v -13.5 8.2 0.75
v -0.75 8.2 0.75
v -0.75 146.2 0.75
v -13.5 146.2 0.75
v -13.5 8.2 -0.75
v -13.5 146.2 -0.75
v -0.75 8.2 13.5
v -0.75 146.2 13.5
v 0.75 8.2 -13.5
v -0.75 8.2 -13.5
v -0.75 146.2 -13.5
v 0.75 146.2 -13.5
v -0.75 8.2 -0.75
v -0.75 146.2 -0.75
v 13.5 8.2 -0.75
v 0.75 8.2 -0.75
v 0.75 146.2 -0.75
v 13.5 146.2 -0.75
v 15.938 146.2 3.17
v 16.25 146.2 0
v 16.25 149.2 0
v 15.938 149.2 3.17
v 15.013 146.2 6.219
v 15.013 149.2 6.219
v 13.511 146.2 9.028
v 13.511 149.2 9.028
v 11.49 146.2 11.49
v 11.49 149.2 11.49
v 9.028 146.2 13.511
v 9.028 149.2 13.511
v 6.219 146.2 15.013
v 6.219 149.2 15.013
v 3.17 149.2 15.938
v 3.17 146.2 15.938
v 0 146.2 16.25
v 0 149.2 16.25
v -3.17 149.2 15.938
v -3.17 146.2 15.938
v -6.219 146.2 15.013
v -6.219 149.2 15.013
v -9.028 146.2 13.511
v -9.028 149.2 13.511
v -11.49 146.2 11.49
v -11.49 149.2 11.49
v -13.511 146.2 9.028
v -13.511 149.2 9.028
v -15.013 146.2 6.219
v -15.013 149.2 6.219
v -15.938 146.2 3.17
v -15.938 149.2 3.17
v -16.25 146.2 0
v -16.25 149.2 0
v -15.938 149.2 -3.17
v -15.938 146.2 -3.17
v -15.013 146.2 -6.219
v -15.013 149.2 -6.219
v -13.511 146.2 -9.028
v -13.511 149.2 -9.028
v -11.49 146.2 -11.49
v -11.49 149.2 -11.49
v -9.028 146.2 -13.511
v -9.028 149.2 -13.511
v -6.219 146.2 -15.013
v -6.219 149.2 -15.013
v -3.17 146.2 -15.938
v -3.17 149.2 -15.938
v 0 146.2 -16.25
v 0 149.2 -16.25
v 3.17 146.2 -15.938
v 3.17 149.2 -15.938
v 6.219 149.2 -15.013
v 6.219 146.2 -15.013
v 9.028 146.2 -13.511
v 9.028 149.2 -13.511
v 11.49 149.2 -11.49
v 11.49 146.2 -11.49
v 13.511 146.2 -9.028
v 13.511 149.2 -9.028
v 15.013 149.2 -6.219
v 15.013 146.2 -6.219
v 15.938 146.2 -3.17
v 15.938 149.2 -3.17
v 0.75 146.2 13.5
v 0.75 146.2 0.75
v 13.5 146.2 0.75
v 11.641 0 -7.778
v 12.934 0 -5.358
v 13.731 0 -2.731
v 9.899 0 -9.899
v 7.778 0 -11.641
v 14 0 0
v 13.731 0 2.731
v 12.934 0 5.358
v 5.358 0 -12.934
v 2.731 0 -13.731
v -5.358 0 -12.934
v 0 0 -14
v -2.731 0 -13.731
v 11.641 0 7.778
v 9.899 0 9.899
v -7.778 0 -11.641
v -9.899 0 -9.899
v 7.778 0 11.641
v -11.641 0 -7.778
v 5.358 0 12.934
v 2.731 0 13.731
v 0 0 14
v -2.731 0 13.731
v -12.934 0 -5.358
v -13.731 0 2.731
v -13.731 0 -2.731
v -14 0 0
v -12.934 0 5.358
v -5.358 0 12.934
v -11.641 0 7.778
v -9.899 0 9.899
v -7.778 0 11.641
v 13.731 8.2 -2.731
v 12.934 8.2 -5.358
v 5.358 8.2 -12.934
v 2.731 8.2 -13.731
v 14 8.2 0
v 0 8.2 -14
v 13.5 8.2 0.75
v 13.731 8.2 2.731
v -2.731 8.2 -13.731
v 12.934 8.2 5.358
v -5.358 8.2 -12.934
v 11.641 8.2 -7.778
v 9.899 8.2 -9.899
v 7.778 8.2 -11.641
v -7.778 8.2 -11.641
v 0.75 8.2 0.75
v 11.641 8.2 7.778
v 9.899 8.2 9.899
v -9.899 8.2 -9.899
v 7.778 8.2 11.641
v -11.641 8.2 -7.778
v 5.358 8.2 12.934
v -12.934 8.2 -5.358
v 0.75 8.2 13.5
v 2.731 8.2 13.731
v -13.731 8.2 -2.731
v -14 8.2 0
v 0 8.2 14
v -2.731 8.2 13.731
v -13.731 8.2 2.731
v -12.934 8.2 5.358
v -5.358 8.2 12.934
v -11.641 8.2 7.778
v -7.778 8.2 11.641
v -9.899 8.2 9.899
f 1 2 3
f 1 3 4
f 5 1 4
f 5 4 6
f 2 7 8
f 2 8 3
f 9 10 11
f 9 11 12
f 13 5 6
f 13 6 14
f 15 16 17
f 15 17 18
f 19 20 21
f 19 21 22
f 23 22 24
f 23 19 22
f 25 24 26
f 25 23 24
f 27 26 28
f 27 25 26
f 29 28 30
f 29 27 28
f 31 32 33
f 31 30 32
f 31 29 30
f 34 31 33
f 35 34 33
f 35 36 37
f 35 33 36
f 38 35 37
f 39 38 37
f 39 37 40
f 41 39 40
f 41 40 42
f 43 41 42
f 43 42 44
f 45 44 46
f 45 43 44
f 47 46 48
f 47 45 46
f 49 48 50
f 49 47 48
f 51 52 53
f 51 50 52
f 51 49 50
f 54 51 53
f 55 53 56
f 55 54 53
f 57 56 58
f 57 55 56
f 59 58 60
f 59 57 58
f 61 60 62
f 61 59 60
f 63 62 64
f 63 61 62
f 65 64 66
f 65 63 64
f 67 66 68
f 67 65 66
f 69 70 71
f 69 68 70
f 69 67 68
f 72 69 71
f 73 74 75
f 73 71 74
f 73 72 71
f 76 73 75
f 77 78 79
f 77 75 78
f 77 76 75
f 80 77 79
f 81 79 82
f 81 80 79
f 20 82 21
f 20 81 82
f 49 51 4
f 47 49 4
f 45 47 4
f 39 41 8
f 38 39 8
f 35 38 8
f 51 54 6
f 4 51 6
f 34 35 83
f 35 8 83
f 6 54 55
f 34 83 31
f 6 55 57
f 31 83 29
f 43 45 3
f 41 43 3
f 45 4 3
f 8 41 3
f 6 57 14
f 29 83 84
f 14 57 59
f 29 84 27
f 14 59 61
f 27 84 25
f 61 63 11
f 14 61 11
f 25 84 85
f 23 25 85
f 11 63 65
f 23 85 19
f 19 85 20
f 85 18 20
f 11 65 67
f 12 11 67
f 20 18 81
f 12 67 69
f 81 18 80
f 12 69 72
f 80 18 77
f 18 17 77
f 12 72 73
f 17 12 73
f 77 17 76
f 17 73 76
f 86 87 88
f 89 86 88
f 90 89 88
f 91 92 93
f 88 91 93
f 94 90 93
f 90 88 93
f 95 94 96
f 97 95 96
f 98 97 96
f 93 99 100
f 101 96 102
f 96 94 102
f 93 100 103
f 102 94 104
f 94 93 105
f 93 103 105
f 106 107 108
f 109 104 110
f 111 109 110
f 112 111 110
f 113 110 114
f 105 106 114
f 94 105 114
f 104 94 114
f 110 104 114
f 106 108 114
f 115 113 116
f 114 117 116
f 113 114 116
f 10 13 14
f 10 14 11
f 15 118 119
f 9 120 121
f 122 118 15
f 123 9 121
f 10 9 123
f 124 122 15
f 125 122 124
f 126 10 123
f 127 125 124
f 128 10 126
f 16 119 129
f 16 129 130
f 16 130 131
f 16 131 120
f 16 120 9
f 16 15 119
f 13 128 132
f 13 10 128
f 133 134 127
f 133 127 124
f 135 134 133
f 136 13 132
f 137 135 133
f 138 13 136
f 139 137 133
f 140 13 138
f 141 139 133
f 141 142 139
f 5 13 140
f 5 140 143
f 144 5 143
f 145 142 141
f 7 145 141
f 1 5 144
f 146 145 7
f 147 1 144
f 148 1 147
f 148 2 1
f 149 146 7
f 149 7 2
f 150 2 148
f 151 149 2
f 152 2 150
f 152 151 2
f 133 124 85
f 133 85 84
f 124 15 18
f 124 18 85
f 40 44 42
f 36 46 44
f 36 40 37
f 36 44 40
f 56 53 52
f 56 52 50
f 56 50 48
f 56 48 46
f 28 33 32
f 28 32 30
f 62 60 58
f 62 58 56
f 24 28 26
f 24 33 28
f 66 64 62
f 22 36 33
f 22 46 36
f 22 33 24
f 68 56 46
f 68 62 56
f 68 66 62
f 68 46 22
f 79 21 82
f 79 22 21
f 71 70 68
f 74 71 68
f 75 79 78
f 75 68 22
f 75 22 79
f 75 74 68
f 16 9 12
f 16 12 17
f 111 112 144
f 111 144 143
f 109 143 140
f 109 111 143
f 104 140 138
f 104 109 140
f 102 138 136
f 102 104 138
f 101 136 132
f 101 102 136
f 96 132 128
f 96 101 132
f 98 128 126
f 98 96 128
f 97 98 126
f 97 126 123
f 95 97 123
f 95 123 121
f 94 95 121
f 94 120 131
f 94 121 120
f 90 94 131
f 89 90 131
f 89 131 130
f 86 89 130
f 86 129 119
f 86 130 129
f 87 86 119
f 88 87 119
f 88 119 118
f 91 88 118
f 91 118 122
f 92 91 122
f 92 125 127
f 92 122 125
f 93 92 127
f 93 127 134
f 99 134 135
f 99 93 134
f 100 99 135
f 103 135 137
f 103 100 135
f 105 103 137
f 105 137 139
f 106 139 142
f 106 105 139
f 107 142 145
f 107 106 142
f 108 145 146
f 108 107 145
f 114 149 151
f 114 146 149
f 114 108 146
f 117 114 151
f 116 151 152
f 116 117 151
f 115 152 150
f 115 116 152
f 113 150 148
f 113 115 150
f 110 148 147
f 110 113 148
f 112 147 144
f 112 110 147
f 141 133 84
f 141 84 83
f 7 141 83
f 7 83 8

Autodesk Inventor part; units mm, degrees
ref_plane "YZ Plane" through (0, 0, 0) normal (1, 0, 0) x (0, 1, 0)
ref_plane "XZ Plane" through (0, 0, 0) normal (0, 1, 0) x (-1, 0, 0)
sketch "Sketch1" plane through (0, 0, 0) normal (0, 1, 0) x (-1, 0, 0)
  circle A0 centre (0, 0) radius 14
  dimension "d0" = 28
extrude "Extrusion1" add sketch "Sketch1" along normal blind 8.2
sketch "Sketch2" plane through (0, 8.2, 0) normal (0, 1, 0) x (1, 0, 0)
  line L0 (-13.5, -0.75) -> (-13.5, 0.75)
  line L1 (13.5, 0.75) -> (13.5, -0.75)
  line L2 (13.5, -0.75) -> (-13.5, 0.75) construction
  line L3 (-13.5, -0.75) -> (13.5, 0.75) construction
  line L4 (0.75, -13.5) -> (-0.75, -13.5)
  line L5 (-0.75, 13.5) -> (0.75, 13.5)
  line L6 (0.75, -13.5) -> (-0.75, 13.5) construction
  line L7 (-0.75, -13.5) -> (0.75, 13.5) construction
  line L8 (-0.75, -13.5) -> (-0.75, -0.75)
  line L9 (-0.75, 0.75) -> (-0.75, 13.5)
  line L10 (-13.5, 0.75) -> (-0.75, 0.75)
  line L11 (13.5, -0.75) -> (0.75, -0.75)
  line L12 (-0.75, -0.75) -> (-13.5, -0.75)
  line L13 (0.75, 13.5) -> (0.75, 0.75)
  line L14 (0.75, -0.75) -> (0.75, -13.5)
  line L15 (0.75, 0.75) -> (13.5, 0.75)
  point P0 (0, 0)
  dimension "d3" = 1.5
  dimension "d4" = 27
  dimension "d5" = 27
extrude "Extrusion2" add sketch "Sketch2" along normal blind 138
sketch "Sketch3" plane through (0, 146.2, 0) normal (0, 1, 0) x (1, 0, 0)
  circle A0 centre (0, 0) radius 16.25
  dimension "d8" = 32.5
extrude "Extrusion3" add sketch "Sketch3" along normal blind 3
equation "\"d5\" = d4"
equation "\"d18\" = d17"
equation "\"d17\" = 2"
properties part number "CH_01_0007_piston"
